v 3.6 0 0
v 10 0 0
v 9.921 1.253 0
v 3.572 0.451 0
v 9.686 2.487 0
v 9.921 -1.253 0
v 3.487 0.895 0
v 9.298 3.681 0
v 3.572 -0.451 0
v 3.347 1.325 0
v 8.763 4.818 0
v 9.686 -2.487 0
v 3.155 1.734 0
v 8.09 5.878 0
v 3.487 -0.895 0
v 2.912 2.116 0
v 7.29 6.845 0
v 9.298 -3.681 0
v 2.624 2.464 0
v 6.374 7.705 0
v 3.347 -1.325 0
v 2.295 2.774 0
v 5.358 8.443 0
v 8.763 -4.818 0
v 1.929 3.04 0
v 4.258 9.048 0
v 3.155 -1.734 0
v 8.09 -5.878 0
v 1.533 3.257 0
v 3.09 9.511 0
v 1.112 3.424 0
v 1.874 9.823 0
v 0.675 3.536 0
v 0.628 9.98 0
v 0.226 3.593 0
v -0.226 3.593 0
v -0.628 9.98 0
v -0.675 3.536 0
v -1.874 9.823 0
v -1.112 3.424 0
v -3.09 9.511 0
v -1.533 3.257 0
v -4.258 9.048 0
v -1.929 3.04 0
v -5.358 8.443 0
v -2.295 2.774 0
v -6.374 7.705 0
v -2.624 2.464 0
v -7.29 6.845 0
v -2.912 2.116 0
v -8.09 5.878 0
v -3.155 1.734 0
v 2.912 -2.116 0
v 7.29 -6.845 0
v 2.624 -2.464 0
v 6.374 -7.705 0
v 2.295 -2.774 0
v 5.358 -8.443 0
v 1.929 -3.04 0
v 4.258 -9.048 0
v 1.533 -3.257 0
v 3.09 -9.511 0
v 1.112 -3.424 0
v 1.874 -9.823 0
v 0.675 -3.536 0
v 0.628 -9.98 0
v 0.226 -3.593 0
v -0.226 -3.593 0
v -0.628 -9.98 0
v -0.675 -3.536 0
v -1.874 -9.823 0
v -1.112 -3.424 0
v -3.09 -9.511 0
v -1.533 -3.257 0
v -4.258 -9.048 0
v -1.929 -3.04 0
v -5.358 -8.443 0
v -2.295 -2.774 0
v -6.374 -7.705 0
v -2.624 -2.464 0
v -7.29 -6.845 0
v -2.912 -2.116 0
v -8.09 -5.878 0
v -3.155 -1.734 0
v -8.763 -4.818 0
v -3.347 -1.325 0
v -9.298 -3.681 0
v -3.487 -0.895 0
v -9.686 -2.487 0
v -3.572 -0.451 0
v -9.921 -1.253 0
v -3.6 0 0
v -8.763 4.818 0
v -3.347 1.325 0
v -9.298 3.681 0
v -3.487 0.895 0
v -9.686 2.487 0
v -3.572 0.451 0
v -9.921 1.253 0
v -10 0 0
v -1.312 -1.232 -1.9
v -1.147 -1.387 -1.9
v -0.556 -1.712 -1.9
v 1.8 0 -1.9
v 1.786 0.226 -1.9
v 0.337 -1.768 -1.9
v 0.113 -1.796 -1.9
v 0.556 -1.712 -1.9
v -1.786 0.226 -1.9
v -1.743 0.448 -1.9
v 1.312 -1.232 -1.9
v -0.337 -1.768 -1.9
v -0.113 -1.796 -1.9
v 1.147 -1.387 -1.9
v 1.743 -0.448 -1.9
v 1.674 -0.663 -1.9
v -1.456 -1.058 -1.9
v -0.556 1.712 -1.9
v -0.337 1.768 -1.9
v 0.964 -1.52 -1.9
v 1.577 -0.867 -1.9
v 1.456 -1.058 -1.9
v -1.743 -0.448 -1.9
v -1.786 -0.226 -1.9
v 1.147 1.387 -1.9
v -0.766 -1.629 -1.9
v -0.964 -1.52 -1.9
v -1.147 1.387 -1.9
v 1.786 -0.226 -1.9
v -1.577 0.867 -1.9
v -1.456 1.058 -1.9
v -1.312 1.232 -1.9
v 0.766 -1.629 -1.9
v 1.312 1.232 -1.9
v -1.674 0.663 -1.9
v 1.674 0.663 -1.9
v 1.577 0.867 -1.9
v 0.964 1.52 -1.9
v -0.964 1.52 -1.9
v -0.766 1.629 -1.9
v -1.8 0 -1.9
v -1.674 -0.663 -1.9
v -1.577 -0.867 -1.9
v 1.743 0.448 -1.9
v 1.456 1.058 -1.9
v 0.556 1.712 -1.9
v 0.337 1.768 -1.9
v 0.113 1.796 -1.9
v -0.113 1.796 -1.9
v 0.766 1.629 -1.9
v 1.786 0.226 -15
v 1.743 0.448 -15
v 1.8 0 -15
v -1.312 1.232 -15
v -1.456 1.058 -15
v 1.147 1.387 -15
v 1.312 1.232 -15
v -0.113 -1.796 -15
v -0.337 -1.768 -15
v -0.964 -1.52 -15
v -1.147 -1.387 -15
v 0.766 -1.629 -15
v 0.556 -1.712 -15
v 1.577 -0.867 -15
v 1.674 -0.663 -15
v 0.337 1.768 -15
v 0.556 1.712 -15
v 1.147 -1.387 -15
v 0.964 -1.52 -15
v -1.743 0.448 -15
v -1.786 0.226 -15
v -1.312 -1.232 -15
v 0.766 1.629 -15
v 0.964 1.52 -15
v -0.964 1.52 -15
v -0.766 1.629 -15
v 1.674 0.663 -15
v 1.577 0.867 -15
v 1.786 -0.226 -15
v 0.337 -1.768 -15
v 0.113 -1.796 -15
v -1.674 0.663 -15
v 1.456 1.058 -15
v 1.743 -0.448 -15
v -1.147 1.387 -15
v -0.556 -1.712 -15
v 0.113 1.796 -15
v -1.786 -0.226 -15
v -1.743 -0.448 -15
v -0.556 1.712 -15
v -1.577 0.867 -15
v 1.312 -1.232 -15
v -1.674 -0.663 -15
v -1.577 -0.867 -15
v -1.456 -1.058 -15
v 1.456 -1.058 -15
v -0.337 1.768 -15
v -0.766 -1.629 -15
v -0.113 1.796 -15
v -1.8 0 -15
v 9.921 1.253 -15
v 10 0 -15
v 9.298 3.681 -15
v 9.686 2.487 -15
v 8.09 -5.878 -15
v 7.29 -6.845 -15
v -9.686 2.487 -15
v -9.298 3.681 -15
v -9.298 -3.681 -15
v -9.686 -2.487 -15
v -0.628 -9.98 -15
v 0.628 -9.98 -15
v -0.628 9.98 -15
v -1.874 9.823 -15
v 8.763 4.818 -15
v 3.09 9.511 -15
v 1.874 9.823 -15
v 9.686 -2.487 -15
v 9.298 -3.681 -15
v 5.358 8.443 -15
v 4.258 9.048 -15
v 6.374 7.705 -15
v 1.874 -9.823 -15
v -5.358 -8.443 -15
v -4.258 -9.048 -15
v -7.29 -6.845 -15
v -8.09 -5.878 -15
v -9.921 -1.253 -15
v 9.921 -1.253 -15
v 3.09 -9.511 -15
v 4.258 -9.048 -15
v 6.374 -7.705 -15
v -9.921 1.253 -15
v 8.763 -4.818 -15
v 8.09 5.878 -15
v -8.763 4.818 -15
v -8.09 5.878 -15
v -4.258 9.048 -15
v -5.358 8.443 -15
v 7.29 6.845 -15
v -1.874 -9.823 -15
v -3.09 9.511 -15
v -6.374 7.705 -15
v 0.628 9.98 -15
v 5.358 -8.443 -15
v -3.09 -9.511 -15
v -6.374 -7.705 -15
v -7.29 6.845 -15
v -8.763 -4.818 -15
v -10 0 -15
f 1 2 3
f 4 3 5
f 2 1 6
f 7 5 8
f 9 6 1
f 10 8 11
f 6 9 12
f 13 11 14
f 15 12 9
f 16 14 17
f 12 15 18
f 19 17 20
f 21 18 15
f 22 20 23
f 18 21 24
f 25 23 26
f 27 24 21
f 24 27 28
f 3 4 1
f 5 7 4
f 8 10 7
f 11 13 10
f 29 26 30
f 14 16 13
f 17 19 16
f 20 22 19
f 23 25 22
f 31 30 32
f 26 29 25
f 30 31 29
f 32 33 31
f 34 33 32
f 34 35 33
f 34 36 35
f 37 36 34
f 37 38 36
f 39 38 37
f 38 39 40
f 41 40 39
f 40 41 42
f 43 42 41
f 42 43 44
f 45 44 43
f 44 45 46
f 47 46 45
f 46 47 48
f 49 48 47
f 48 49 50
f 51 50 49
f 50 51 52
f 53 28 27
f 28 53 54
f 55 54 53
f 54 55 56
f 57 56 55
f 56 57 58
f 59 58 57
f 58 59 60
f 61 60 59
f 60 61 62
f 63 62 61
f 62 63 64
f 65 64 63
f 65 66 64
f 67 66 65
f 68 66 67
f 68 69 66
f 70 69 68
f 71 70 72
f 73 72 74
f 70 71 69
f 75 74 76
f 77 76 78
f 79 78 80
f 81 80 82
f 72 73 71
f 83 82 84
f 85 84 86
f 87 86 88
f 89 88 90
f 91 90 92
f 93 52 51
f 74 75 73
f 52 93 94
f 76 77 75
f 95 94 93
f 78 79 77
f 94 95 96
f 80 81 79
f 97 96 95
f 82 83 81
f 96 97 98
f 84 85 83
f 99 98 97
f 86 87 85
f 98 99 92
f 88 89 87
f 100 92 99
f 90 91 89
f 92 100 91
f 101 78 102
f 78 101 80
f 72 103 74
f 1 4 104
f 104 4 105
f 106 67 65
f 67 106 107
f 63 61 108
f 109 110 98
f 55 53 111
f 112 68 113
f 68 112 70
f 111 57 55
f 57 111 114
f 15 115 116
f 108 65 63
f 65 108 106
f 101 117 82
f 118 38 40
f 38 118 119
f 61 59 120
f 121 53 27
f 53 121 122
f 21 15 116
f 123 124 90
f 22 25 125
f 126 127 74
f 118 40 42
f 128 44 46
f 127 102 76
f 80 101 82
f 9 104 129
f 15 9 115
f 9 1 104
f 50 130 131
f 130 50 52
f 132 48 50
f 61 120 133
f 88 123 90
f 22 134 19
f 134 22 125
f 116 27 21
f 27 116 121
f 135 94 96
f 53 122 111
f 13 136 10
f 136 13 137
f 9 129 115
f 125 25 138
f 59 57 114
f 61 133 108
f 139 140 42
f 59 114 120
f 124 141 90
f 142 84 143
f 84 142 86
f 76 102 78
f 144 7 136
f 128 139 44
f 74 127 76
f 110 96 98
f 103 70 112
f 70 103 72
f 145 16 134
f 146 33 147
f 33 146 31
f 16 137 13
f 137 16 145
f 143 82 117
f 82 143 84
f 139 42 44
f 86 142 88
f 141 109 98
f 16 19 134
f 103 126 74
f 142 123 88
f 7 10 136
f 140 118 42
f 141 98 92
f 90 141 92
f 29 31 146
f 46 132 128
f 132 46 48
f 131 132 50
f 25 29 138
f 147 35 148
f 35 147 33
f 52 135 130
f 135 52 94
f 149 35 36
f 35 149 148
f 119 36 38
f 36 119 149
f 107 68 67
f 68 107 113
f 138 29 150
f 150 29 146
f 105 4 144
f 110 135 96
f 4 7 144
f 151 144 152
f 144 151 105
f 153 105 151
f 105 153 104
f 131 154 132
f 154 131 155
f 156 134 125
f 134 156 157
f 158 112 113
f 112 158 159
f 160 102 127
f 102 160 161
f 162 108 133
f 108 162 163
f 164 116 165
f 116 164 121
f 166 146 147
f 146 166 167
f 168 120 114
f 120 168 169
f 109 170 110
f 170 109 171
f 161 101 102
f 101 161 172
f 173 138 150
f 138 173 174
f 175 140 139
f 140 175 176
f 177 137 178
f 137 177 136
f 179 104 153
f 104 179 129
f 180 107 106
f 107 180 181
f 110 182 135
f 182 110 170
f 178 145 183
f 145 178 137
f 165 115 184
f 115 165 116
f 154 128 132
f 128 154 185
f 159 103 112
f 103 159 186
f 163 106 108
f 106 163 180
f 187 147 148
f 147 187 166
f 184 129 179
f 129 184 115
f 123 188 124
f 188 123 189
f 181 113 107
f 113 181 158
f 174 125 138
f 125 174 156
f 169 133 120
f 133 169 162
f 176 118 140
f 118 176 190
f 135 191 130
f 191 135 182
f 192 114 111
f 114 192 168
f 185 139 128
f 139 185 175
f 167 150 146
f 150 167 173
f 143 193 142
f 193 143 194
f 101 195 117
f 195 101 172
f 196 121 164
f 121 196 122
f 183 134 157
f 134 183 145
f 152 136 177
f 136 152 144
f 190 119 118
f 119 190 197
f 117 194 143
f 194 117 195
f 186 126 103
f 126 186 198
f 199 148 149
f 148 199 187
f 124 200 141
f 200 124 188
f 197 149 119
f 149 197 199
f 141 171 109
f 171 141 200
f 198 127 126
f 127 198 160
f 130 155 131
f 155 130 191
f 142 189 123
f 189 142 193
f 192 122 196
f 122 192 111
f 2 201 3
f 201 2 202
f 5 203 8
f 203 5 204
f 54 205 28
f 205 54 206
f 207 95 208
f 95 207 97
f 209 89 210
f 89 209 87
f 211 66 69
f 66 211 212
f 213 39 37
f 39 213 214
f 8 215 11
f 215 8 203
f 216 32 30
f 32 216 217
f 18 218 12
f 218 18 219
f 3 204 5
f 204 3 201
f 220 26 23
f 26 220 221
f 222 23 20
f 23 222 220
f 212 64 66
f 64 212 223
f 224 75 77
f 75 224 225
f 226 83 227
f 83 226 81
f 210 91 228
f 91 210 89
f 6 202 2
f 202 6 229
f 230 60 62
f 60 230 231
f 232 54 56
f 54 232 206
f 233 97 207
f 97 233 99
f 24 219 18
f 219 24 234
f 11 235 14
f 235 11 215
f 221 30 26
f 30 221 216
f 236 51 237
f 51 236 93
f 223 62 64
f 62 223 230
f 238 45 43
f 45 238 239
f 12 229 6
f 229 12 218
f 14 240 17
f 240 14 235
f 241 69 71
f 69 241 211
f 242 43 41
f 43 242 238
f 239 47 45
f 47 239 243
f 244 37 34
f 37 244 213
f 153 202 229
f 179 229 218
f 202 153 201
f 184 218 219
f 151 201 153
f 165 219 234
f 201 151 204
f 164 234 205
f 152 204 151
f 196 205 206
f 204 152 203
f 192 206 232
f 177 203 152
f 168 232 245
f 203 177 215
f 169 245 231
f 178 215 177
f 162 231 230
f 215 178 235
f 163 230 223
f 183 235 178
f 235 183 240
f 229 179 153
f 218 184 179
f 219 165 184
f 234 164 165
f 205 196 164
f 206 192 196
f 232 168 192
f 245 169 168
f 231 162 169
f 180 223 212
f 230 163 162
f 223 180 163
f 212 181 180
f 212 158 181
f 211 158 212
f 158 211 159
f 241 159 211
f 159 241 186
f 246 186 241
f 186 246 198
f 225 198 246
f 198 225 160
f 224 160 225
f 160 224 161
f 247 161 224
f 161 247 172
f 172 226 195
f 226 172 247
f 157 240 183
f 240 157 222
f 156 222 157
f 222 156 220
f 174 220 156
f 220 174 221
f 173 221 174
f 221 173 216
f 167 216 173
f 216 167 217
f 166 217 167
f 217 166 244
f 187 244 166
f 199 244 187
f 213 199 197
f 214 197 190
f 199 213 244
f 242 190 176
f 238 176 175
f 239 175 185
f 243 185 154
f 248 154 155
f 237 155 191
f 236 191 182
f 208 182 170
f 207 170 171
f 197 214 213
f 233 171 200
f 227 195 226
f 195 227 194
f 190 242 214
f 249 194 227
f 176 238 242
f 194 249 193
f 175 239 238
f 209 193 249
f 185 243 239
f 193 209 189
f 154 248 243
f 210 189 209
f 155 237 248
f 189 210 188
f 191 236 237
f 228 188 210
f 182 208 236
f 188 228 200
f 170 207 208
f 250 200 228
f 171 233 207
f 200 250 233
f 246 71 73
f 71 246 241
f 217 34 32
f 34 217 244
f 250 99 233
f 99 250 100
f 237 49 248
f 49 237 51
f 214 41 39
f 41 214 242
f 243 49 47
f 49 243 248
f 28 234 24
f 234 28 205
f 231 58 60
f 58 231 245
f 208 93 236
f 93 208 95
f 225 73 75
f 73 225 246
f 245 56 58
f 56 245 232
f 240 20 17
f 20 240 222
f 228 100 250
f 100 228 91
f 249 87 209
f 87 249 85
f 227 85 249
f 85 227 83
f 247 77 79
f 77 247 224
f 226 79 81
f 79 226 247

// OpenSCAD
$fn = 50;

difference() {
	union() {
		translate(v = [0, 0, -15.0]) {
			cylinder(h = 15, r = 10.0);
		}
	}
	union() {
		translate(v = [0, 0, 0]) {
			rotate(a = [0, 0, 0]) {
				difference() {
					union() {
						translate(v = [0, 0, -18.0]) {
							cylinder(h = 18, r = 1.5);
						}
						translate(v = [0, 0, -1.9]) {
							cylinder(h = 1.9, r1 = 1.8, r2 = 3.6);
						}
						translate(v = [0, 0, -18.0]) {
							cylinder(h = 18, r = 1.8);
						}
						translate(v = [0, 0, -18.0]) {
							cylinder(h = 18, r = 1.5);
						}
					}
					union();
				}
			}
		}
	}
}
